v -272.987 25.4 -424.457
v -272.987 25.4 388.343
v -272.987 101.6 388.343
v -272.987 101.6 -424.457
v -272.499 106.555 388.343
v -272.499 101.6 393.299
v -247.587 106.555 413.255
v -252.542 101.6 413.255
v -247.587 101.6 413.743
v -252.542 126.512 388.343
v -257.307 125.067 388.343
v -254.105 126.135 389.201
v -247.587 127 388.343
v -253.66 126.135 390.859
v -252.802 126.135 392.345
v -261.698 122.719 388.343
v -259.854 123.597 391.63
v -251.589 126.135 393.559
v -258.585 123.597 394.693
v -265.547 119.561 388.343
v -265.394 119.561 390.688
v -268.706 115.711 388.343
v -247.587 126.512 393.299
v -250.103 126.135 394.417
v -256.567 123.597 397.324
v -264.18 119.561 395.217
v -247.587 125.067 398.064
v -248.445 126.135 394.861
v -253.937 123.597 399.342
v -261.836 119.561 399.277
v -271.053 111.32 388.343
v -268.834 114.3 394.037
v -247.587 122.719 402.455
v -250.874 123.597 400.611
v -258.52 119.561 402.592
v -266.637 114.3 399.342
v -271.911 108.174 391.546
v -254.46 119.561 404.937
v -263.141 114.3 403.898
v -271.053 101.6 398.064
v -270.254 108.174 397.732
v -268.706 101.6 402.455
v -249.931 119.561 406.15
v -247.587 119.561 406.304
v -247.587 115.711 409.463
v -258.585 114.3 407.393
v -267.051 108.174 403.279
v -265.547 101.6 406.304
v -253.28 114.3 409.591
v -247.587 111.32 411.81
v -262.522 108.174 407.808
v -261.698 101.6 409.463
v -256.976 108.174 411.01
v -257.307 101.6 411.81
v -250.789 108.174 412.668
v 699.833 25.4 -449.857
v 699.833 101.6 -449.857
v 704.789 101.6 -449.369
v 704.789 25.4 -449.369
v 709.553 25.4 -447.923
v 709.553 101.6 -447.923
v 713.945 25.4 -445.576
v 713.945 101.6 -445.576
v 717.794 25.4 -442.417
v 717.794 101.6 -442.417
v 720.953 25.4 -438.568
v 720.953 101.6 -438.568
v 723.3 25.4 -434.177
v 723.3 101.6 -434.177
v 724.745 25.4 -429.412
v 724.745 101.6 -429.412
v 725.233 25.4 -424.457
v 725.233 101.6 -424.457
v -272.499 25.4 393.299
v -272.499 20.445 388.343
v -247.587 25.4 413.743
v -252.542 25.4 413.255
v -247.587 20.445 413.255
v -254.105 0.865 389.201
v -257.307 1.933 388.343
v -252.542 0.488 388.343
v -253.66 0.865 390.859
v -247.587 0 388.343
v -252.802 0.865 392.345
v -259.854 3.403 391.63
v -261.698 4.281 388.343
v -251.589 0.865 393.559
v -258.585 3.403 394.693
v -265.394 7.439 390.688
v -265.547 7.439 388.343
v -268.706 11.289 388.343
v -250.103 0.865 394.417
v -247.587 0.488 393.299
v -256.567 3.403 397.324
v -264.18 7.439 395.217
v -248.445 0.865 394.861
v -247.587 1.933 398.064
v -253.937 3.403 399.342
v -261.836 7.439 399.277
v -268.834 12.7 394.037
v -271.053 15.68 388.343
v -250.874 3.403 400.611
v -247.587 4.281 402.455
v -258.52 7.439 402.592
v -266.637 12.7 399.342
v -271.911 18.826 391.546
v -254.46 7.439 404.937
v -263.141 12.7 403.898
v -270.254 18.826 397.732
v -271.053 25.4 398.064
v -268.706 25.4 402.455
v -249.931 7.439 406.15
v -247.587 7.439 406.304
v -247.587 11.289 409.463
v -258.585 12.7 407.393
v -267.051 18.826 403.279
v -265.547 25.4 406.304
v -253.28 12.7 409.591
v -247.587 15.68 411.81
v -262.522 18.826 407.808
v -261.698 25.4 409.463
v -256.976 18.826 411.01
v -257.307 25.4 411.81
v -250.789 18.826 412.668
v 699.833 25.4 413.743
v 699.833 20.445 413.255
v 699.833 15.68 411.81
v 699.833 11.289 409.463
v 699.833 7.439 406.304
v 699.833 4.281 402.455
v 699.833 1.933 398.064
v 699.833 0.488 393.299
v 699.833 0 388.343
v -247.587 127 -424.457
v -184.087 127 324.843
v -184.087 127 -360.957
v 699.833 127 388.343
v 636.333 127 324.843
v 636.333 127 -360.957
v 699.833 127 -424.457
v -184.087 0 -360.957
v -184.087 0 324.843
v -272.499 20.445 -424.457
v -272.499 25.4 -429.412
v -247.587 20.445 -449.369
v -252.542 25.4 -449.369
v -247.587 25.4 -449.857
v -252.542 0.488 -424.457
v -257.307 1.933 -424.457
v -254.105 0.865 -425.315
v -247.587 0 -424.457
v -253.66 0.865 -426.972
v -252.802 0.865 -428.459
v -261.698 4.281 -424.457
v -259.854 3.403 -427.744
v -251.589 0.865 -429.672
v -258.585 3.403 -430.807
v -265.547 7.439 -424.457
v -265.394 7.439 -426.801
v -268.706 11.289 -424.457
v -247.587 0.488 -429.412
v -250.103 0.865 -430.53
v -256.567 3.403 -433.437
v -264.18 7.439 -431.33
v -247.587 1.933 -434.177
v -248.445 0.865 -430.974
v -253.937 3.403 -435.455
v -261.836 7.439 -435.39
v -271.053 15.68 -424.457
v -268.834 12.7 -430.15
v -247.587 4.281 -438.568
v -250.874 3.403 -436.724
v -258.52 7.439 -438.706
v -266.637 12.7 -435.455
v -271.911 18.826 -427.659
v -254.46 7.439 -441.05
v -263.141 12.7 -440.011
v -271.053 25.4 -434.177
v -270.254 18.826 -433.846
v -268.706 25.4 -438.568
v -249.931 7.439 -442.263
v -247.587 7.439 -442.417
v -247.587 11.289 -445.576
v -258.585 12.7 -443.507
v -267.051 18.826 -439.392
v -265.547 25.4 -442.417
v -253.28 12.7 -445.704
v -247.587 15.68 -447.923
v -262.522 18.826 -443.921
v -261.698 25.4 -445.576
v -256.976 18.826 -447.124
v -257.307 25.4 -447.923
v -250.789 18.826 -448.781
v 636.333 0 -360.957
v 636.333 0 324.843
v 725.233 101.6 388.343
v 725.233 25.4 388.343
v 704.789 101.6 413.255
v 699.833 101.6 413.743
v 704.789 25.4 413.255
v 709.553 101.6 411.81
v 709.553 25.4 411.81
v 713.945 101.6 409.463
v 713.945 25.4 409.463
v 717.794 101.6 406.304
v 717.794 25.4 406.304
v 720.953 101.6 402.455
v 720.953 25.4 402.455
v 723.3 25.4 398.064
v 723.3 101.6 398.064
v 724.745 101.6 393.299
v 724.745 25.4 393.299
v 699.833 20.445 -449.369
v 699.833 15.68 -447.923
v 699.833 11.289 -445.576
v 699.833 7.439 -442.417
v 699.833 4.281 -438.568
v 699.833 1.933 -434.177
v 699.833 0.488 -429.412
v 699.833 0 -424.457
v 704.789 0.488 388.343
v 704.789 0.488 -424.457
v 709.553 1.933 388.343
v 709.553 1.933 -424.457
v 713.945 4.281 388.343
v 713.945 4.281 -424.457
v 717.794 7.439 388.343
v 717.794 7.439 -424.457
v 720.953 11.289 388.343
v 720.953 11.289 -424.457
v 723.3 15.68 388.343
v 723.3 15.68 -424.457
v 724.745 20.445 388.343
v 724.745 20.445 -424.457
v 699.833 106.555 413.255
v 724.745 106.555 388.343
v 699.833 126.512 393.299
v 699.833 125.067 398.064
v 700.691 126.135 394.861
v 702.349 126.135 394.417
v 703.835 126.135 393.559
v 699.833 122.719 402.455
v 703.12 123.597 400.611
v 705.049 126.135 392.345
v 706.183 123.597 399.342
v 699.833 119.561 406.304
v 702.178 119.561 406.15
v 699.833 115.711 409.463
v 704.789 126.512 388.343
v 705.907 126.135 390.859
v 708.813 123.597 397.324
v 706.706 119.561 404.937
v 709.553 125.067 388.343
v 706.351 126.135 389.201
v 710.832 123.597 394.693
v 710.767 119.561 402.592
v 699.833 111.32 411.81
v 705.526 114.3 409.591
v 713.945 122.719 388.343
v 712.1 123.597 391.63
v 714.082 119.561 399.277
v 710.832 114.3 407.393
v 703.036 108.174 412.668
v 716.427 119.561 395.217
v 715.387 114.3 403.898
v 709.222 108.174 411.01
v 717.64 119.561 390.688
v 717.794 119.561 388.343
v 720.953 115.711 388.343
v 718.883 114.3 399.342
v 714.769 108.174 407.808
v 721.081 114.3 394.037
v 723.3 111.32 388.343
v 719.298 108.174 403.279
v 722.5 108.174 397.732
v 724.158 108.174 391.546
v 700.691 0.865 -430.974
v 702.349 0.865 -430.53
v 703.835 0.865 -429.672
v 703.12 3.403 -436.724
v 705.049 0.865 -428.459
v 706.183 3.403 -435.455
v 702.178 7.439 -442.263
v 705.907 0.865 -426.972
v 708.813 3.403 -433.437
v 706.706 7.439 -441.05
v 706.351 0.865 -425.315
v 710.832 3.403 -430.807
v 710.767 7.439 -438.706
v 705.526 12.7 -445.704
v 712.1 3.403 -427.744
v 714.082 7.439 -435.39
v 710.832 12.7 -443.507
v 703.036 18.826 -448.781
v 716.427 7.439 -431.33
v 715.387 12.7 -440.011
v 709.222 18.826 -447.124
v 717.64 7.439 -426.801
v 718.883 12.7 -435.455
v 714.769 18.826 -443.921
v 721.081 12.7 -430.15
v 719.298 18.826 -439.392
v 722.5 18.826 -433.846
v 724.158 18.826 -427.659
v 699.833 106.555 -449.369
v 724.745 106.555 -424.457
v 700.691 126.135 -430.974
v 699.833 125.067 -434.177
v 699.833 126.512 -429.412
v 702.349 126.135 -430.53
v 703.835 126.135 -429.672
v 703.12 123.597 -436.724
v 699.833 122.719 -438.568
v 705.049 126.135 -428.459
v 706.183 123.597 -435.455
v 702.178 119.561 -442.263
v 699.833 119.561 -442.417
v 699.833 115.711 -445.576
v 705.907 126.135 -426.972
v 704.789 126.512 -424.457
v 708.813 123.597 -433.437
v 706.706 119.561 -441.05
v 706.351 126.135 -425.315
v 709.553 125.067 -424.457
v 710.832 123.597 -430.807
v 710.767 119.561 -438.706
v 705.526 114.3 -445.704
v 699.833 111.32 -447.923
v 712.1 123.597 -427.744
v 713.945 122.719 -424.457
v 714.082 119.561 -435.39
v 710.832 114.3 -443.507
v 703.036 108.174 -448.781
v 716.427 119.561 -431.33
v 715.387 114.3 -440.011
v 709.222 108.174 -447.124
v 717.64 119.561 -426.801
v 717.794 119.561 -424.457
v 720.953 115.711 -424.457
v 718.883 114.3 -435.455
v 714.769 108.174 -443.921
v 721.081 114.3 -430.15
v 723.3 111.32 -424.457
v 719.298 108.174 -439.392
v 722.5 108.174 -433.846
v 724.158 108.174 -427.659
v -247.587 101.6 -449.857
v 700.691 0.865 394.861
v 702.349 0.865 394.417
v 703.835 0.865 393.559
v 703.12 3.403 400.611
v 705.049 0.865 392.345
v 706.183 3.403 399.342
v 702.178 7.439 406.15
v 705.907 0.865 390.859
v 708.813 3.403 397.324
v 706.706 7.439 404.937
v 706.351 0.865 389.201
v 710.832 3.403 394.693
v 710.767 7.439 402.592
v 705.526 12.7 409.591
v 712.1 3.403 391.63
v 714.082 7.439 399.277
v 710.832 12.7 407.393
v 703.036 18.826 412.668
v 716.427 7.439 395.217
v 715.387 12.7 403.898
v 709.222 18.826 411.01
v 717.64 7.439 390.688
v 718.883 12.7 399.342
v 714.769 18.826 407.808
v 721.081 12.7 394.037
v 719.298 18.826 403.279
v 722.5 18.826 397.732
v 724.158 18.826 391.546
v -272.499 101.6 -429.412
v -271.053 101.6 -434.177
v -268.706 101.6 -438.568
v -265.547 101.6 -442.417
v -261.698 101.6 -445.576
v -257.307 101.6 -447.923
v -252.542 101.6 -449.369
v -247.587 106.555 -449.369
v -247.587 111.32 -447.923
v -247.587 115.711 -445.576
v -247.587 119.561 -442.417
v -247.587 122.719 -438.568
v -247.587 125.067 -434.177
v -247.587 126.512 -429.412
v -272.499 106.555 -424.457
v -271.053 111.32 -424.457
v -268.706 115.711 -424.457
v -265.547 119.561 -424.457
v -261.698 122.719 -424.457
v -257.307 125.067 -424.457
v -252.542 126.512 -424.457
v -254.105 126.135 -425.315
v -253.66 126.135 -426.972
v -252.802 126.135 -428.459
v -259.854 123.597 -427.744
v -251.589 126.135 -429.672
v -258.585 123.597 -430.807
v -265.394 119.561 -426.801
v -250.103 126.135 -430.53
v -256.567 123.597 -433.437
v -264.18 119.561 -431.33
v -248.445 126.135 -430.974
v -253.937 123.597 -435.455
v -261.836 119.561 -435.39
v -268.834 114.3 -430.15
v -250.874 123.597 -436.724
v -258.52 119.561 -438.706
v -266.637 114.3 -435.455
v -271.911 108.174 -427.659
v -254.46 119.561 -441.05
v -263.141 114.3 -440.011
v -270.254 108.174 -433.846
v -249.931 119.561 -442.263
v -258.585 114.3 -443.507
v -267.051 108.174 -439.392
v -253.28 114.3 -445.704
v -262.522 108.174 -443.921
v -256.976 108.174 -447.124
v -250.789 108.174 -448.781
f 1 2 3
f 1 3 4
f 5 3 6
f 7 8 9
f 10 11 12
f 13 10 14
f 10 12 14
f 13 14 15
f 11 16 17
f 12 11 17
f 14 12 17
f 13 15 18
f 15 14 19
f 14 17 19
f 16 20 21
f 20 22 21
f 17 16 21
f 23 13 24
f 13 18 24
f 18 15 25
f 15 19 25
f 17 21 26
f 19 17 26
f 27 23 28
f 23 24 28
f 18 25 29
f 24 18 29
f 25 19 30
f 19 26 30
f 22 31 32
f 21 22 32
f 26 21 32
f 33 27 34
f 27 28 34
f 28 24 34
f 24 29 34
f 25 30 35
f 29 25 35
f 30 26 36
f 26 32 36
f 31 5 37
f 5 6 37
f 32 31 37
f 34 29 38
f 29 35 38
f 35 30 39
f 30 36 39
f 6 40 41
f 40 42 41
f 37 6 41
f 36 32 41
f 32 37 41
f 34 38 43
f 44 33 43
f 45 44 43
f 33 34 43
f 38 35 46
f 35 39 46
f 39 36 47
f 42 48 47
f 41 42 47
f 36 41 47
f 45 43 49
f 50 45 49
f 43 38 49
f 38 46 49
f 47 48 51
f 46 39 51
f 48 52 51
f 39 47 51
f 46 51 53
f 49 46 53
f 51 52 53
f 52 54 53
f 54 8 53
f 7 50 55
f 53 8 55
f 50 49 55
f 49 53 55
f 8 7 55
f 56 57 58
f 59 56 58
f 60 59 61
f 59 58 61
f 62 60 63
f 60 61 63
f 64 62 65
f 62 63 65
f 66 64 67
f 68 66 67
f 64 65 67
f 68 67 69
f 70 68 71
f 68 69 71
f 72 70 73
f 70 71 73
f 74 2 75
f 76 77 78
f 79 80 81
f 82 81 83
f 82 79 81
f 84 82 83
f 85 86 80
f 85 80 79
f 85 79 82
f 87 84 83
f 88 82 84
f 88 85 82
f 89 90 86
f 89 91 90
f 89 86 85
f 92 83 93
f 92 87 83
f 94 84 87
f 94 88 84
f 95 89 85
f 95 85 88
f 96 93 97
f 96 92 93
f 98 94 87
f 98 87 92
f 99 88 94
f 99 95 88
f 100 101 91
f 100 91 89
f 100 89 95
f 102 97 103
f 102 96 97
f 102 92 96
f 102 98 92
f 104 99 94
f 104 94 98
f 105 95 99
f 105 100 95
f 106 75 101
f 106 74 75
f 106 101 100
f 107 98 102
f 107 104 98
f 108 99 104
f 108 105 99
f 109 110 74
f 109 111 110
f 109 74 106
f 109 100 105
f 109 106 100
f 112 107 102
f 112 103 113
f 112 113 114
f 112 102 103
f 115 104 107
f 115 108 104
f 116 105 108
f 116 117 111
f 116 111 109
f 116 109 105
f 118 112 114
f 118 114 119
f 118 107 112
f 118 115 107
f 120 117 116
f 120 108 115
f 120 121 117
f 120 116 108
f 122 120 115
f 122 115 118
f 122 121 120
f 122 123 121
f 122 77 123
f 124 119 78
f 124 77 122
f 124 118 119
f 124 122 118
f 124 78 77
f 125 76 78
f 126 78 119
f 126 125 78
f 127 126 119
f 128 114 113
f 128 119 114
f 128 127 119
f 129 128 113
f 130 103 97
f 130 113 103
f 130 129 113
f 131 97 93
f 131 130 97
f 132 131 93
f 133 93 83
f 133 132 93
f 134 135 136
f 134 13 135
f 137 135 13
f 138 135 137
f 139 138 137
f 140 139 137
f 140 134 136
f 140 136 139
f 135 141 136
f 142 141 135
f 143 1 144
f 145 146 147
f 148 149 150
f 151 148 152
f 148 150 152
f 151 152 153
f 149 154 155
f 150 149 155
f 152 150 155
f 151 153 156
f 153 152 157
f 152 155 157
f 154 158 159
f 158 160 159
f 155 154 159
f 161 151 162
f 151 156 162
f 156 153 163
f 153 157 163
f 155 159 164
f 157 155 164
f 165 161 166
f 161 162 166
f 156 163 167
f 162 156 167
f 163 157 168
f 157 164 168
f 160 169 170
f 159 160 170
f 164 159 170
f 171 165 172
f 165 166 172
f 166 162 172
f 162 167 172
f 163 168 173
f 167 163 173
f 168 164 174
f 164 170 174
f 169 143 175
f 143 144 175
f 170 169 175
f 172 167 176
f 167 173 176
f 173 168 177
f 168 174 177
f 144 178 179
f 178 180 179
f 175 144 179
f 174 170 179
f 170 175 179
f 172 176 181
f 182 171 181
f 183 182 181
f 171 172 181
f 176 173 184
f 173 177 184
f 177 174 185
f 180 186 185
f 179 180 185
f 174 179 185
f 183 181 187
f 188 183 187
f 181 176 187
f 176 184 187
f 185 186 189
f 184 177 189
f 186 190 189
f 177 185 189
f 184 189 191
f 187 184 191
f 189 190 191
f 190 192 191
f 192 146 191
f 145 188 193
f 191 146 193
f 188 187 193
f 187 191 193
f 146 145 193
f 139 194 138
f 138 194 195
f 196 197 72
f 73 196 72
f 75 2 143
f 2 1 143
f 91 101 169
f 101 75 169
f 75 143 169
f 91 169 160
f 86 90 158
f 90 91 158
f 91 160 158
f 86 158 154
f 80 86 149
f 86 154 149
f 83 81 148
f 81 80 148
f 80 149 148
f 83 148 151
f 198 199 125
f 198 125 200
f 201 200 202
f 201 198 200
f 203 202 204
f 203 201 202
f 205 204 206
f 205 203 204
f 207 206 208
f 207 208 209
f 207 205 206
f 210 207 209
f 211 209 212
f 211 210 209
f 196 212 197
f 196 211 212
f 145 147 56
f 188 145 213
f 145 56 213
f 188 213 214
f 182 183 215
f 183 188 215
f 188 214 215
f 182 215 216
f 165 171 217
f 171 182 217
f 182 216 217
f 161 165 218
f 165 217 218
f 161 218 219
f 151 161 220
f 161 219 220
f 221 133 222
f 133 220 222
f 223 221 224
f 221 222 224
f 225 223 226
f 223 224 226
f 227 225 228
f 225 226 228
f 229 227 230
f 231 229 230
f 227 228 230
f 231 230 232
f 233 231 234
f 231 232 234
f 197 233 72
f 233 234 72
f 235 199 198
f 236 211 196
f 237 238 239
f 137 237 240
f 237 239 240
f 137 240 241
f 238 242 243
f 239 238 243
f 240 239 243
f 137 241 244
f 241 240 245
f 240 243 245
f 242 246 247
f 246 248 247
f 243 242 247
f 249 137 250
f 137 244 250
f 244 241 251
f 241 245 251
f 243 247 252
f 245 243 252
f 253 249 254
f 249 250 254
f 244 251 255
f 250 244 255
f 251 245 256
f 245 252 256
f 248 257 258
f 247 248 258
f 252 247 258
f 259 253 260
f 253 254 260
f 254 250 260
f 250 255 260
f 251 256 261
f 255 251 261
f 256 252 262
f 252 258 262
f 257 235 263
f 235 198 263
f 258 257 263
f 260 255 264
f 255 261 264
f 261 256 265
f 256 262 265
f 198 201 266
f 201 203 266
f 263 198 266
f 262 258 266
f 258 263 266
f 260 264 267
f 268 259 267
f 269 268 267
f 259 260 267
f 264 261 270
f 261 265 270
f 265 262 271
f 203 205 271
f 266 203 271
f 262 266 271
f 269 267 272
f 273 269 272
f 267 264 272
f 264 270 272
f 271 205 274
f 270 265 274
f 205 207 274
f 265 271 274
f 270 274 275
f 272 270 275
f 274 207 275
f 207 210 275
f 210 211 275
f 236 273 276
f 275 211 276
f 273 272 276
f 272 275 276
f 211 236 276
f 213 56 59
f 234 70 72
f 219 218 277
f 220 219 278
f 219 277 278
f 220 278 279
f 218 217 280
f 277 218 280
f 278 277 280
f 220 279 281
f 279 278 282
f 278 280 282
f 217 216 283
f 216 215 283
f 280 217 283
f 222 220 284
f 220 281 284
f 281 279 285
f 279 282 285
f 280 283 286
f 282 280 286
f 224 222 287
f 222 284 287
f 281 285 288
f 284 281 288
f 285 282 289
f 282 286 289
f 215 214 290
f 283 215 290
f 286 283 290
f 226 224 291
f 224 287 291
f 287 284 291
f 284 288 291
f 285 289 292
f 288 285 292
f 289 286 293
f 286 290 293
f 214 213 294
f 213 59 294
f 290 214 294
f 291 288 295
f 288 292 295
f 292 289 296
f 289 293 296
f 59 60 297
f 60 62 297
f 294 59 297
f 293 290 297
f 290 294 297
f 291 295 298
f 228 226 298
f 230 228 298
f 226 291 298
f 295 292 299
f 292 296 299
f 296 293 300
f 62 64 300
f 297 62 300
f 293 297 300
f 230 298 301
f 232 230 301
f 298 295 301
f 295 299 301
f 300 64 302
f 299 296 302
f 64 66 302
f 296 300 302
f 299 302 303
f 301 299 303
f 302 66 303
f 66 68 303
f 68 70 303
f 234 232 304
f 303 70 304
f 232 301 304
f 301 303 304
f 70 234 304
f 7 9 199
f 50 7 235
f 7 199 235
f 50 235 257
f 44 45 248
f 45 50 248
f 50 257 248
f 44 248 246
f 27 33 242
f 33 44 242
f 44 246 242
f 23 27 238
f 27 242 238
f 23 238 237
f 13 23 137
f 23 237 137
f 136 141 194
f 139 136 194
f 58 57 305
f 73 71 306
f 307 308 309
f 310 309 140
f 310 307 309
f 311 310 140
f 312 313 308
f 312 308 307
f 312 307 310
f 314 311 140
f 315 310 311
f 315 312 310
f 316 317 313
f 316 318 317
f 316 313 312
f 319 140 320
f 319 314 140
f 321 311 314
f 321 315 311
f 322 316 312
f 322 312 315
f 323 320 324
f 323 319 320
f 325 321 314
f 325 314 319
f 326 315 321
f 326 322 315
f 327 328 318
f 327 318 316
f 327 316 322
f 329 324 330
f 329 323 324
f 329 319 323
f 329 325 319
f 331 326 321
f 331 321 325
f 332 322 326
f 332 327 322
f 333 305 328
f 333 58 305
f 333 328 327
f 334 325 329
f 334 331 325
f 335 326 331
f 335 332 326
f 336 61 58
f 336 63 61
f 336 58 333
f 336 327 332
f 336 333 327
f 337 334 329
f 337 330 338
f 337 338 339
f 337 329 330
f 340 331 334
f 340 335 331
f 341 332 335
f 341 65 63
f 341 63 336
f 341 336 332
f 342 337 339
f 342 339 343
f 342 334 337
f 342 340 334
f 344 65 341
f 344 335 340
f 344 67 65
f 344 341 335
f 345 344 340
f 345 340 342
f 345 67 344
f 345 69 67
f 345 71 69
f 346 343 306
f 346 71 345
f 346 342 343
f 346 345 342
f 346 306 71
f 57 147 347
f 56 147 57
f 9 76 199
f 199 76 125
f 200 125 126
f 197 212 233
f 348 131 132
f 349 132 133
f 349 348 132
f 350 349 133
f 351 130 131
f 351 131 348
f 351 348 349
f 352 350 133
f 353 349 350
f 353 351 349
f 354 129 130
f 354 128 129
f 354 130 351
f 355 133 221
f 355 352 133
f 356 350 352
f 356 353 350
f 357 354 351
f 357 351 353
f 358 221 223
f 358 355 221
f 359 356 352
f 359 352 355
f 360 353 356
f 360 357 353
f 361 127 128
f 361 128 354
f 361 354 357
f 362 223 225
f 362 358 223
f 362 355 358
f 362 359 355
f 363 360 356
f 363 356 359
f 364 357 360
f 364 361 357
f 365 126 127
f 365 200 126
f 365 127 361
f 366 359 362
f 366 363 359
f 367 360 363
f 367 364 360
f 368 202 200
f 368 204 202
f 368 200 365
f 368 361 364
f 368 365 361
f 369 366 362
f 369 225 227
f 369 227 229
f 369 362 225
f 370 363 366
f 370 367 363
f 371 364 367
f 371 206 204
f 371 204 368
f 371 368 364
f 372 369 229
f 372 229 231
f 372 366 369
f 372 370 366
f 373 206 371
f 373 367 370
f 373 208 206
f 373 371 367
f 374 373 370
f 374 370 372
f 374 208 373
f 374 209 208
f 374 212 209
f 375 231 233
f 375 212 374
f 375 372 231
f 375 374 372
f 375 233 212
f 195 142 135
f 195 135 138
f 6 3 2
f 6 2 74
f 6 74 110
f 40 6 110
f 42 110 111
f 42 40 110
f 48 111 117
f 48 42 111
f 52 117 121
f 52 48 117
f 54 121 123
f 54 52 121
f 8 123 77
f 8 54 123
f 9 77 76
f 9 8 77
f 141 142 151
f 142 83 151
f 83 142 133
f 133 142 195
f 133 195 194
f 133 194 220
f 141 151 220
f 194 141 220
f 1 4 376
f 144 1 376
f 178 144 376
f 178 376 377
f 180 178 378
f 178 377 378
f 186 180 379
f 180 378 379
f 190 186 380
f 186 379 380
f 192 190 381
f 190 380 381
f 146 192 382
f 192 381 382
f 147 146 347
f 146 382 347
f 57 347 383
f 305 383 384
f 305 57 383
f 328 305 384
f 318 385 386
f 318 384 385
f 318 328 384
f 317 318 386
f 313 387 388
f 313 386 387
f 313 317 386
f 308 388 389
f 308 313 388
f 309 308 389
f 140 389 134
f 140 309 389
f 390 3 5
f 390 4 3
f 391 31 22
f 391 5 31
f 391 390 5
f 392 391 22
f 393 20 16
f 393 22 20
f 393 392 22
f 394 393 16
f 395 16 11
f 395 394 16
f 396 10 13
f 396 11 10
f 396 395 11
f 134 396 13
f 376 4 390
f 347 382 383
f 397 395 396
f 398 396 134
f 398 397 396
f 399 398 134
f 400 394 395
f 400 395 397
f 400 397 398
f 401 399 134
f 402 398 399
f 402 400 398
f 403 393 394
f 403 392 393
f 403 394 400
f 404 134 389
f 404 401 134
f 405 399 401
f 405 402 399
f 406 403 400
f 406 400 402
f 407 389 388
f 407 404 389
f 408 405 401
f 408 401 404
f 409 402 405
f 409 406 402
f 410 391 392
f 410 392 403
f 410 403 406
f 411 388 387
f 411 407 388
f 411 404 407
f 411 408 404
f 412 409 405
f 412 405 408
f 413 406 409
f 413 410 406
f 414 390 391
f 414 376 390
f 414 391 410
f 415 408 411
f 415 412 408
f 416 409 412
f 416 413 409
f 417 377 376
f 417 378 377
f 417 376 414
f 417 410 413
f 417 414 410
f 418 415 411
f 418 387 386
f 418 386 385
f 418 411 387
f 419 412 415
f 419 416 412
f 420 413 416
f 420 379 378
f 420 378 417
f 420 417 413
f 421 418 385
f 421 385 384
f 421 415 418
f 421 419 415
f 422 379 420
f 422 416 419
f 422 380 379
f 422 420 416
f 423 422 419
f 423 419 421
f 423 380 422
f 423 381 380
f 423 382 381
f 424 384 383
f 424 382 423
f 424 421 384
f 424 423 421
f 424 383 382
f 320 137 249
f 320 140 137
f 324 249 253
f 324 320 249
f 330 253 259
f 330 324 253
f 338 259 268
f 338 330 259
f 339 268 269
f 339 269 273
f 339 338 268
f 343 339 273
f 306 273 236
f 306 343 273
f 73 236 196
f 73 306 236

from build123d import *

# Parameters (mm, degrees)
SKETCH1_W           = 998.22
SKETCH1_H           = 863.6
BOSS_EXTRUDE1_DEPTH = 127
SKETCH2_W           = 820.42
SKETCH2_H           = 685.8
CUT_EXTRUDE1_DEPTH  = 127
FILLET1_R           = 25.4


with BuildPart() as part:
    # Sketch1 → Boss-Extrude1 (new body)
    with BuildSketch(Plane(origin=(0, 0, 0), x_dir=(1, 0, 0), z_dir=(0, 1, 0))):
        with Locations((226.123239937, 18.056640537)):
            Rectangle(SKETCH1_W, SKETCH1_H)
    extrude(amount=BOSS_EXTRUDE1_DEPTH)

    # Sketch2 → Cut-Extrude1 (cut)
    with BuildSketch(Plane.XZ):
        with Locations((226.123239937, -18.056640537)):
            Rectangle(SKETCH2_W, SKETCH2_H)
    extrude(amount=-CUT_EXTRUDE1_DEPTH, mode=Mode.SUBTRACT)

    # Fillet1
    fillet1_edges = [part.edges().sort_by_distance(p)[0] for p in [
        (-272.986760063, 63.5, 413.743359463),
        (-272.986760063, 63.5, -449.856640537),
        (-272.986760063, 0, -18.056640537),
        (-272.986760063, 127, -18.056640537),
        (725.233239937, 63.5, 413.743359463),
        (226.123239937, 0, 413.743359463),
        (226.123239937, 127, 413.743359463),
        (725.233239937, 63.5, -449.856640537),
        (226.123239937, 0, -449.856640537),
        (226.123239937, 127, -449.856640537),
        (725.233239937, 0, -18.056640537),
        (725.233239937, 127, -18.056640537),
    ]]
    fillet(fillet1_edges, radius=FILLET1_R)


solid = part.part
